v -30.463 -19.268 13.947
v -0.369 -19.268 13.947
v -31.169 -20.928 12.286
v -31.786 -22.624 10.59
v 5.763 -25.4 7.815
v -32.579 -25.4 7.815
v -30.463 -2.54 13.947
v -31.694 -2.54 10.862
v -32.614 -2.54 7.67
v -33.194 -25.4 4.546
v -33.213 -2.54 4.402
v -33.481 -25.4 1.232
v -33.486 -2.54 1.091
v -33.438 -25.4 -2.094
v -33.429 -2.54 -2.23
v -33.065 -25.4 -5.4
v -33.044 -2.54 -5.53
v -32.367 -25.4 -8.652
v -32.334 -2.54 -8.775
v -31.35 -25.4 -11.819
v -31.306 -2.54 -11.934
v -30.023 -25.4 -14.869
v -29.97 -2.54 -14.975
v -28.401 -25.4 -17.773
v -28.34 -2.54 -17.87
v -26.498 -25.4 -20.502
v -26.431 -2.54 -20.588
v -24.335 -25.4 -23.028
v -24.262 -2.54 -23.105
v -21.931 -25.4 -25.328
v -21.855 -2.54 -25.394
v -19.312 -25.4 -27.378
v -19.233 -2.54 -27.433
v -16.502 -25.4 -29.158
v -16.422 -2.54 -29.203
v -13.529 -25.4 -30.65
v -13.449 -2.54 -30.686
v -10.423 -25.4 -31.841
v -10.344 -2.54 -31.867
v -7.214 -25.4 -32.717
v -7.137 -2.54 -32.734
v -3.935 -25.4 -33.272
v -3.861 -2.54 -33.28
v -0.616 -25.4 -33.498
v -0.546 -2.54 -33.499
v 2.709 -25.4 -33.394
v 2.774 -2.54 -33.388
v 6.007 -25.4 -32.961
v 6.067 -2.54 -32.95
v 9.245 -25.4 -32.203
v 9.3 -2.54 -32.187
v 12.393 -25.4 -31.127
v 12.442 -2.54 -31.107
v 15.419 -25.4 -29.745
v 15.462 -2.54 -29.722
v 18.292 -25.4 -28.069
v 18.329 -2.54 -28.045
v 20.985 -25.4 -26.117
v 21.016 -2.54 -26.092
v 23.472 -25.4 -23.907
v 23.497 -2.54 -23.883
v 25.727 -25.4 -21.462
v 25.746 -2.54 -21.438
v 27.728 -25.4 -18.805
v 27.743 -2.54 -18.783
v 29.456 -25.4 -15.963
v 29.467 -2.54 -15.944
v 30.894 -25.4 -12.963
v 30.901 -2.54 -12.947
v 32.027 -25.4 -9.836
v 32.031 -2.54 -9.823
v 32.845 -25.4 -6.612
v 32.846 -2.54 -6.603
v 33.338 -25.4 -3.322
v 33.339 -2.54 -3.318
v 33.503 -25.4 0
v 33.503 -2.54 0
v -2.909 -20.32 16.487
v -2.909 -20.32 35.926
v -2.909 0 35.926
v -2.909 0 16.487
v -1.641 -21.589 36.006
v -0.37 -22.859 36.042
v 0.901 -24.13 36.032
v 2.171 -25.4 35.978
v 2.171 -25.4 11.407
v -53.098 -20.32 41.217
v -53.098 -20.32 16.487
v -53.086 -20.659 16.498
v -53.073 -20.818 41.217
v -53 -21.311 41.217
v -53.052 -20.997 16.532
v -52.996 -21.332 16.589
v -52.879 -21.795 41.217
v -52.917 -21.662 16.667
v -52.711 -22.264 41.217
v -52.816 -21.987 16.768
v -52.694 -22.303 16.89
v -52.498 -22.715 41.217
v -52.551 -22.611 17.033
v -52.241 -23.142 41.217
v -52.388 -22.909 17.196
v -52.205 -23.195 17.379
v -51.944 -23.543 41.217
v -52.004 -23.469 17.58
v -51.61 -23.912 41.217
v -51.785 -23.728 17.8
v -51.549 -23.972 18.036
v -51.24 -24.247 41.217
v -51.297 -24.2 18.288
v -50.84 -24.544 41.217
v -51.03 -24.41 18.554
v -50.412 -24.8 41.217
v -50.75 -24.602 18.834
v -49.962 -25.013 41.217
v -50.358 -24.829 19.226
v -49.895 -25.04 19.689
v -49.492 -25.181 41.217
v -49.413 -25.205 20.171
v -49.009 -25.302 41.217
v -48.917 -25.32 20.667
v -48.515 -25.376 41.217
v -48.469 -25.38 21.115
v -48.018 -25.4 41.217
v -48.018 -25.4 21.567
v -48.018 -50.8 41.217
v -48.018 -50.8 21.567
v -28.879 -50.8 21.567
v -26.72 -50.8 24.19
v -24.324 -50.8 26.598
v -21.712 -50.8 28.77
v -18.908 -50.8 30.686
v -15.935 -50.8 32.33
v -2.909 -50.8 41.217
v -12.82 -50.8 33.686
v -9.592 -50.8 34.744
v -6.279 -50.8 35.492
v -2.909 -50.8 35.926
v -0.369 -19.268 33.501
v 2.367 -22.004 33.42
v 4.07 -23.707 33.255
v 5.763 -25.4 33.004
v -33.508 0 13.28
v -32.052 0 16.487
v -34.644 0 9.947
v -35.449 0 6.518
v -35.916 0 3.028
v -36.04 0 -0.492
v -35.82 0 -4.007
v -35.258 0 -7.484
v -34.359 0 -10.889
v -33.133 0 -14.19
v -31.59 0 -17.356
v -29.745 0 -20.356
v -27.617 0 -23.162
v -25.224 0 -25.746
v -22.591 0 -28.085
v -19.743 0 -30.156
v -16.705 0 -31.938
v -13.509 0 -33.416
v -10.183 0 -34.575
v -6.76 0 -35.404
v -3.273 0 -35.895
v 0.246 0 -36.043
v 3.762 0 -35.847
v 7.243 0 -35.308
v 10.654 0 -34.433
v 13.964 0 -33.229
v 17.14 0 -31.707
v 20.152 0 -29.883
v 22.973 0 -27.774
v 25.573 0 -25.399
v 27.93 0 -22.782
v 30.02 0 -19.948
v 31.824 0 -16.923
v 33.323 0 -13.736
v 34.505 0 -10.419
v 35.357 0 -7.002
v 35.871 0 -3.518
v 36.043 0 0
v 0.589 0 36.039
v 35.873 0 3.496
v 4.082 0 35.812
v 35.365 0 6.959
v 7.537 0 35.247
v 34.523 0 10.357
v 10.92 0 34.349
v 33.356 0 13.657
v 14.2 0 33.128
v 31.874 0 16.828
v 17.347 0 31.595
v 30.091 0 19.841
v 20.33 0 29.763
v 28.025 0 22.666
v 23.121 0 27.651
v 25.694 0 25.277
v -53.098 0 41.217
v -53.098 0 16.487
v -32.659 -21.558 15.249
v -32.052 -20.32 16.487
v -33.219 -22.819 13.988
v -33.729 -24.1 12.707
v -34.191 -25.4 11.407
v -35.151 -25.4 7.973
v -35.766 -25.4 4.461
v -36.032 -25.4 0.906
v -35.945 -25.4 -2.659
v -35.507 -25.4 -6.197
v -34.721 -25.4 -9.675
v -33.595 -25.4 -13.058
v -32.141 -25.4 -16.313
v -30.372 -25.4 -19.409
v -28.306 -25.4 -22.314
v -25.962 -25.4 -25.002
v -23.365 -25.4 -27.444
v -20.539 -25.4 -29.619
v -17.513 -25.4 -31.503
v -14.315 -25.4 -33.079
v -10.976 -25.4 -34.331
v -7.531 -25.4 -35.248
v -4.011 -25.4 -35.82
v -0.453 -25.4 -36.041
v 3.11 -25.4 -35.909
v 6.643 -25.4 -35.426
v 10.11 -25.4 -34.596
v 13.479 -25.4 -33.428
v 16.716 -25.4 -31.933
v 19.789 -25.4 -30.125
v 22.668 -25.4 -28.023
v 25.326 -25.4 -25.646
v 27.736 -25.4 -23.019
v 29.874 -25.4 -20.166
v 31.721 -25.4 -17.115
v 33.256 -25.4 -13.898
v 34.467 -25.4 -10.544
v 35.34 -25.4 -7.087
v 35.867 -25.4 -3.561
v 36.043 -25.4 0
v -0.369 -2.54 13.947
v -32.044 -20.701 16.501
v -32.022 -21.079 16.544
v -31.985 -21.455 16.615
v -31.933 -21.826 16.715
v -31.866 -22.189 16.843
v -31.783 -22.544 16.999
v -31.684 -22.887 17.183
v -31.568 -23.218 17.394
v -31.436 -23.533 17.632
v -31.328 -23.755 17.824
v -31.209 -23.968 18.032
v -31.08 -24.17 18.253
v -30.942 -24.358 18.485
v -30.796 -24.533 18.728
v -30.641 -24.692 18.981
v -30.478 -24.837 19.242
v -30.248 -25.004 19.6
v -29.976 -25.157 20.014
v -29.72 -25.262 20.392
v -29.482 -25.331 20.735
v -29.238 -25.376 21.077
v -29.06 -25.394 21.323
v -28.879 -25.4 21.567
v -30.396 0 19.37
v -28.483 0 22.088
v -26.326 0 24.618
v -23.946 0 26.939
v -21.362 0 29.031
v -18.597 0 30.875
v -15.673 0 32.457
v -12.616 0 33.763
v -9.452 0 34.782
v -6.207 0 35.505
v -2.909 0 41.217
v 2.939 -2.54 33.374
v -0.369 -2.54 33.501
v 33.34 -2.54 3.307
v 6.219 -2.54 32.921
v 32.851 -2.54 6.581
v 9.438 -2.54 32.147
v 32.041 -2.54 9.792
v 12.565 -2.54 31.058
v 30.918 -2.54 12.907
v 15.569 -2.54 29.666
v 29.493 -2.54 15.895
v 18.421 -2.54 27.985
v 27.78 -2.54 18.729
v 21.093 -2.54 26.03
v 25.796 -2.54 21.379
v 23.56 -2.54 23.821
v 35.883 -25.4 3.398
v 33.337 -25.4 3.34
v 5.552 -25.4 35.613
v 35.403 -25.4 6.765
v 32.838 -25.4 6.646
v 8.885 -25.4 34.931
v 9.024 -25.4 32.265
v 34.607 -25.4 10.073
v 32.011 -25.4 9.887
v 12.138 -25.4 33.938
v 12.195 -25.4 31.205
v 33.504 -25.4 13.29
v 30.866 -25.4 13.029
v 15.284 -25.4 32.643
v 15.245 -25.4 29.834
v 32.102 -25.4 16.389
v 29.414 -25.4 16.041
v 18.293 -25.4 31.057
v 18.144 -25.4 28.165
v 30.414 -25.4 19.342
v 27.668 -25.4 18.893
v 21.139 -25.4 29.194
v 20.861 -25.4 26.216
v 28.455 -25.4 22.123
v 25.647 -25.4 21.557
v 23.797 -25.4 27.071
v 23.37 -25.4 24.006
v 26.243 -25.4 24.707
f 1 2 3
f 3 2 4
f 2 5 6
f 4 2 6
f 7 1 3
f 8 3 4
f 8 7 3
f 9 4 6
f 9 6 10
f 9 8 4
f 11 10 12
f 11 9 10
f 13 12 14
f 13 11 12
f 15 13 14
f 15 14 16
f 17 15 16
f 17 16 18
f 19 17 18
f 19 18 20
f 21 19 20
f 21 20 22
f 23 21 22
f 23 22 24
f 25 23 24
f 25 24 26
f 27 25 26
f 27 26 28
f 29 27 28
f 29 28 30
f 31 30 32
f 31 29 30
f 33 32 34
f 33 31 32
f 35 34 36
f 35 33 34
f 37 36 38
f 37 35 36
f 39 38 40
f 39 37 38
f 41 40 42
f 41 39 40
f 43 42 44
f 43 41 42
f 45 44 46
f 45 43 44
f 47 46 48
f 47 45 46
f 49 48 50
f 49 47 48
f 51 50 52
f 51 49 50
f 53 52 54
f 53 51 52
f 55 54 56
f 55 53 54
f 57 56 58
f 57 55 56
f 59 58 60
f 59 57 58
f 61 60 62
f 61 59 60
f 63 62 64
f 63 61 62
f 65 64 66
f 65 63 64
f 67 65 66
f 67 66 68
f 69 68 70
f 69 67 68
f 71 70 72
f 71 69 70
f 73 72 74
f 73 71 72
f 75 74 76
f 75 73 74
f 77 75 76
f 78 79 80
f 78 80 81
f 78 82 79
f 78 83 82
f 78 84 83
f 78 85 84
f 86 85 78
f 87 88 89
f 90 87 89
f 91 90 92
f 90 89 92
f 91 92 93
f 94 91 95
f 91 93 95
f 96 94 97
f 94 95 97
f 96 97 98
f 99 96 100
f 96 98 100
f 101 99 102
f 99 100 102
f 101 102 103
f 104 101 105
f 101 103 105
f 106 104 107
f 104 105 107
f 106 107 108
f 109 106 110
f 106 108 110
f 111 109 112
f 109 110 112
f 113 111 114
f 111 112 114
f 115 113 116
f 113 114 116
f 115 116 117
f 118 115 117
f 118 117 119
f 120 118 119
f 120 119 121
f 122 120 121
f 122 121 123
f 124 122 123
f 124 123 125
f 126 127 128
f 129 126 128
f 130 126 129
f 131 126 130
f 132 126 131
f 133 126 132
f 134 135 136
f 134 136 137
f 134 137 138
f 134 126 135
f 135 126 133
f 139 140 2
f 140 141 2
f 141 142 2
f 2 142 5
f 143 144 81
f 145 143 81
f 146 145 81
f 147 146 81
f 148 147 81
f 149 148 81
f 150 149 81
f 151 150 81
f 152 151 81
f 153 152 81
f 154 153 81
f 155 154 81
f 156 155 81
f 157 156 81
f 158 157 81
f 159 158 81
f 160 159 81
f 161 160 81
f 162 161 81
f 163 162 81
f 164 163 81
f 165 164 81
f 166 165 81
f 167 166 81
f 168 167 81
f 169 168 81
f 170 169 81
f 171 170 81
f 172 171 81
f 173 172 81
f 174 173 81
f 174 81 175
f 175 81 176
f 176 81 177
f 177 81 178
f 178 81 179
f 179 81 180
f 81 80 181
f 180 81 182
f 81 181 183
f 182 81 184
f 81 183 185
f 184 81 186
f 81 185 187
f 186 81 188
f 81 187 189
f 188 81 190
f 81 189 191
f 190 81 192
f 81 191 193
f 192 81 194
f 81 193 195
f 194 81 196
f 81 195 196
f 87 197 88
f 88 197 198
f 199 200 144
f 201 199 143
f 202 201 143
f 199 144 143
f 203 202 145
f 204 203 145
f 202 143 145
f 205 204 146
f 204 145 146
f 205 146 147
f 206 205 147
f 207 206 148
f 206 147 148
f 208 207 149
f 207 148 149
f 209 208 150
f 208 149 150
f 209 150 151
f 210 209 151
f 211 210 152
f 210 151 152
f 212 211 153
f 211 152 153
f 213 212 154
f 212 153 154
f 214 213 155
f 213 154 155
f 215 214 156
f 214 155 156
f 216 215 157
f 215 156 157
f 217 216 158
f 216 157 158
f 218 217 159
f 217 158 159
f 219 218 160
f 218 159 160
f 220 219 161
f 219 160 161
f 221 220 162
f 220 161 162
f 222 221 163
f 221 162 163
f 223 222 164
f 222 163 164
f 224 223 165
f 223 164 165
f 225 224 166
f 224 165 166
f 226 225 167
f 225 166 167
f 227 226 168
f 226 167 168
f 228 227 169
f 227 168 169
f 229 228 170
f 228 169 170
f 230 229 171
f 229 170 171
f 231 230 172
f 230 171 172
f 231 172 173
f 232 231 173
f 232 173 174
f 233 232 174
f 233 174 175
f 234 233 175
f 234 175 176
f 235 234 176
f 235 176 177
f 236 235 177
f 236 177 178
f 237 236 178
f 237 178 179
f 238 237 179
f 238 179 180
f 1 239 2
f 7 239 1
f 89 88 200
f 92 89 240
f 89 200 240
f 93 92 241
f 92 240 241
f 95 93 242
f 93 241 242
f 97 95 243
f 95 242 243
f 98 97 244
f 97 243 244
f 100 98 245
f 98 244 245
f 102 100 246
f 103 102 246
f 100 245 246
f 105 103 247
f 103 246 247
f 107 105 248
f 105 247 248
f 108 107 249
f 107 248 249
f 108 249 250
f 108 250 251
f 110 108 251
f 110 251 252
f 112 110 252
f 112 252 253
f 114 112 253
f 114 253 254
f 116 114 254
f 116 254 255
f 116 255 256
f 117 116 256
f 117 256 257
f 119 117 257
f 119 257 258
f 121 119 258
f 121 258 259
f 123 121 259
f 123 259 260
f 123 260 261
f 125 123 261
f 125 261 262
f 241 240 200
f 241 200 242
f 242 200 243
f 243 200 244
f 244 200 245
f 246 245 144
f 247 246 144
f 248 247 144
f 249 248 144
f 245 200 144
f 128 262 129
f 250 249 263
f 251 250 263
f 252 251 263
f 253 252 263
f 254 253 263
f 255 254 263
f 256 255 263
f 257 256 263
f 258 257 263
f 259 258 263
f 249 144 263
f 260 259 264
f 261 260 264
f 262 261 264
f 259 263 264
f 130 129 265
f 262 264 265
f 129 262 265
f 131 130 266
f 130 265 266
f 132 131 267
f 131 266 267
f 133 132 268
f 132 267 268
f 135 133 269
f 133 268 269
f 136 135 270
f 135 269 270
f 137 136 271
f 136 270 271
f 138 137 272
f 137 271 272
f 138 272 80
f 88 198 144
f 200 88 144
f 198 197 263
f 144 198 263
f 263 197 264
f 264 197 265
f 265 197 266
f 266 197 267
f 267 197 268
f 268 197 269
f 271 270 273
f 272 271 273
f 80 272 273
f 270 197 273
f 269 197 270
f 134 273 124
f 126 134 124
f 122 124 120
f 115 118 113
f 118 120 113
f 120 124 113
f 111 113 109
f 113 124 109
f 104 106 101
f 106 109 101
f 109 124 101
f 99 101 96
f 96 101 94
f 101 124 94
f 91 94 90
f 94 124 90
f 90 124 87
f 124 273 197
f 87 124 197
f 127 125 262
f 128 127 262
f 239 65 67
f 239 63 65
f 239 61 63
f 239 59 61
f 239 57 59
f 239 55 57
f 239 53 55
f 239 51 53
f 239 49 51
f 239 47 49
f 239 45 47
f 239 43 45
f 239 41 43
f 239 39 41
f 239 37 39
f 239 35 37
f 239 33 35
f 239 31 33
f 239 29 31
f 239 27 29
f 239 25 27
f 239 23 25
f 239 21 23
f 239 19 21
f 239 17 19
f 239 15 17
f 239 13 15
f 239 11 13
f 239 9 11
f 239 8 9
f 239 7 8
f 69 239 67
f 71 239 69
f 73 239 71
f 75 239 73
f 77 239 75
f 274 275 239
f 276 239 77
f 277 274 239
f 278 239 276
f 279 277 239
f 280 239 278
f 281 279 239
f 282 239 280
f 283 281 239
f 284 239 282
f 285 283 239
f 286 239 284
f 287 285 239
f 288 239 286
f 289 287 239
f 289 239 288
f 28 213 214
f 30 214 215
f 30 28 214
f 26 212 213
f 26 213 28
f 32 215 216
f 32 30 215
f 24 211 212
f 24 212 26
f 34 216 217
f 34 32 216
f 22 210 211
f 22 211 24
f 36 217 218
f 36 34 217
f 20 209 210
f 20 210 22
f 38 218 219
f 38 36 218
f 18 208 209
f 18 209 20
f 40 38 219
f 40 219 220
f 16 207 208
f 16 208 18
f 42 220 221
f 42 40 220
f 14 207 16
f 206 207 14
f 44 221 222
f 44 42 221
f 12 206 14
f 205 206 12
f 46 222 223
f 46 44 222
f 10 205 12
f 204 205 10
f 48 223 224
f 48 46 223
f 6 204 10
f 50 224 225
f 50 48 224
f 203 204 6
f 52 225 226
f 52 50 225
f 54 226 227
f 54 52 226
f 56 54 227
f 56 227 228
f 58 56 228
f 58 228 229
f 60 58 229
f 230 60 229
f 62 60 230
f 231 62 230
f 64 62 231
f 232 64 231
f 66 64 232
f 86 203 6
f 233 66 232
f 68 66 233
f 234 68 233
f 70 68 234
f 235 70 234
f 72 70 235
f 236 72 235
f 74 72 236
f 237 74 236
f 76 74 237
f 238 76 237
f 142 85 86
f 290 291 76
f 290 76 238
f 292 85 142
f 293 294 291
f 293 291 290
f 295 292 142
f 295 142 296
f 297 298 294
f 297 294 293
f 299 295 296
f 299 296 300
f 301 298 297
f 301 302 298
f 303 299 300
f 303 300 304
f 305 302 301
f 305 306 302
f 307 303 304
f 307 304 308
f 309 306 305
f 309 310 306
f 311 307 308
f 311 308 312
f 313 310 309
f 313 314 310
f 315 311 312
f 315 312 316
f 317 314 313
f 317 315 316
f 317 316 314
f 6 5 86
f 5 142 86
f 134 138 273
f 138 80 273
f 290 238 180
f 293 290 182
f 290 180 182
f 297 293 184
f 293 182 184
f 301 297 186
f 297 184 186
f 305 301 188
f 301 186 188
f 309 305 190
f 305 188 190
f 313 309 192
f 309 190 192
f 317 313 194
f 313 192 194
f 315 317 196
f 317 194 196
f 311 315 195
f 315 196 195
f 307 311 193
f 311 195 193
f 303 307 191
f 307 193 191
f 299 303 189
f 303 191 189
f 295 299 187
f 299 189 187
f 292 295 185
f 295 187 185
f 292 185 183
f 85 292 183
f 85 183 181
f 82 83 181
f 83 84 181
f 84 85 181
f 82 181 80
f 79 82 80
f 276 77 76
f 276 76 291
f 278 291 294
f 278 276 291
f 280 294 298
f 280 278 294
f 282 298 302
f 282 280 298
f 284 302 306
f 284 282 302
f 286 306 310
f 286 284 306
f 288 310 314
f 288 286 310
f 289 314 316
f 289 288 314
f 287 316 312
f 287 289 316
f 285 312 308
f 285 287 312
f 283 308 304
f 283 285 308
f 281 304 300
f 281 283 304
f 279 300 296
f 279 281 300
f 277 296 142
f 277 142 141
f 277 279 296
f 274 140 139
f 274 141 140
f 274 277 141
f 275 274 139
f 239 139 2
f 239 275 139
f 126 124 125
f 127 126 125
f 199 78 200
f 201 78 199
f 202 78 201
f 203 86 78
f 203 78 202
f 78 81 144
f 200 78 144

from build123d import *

# Parameters (mm, degrees)
F1_DEPTH = 25.4
F2_R     = 5.08
F3_SIZE  = 5.08
F4_T     = -2.54
F5_DEPTH = 25.4


with BuildPart() as f1:
    # F0 (on Front) → F1 (new body)
    with BuildSketch(Plane.XZ):
        with BuildLine():
            ThreePointArc((-32.0517227431, 16.4869092405), (-20.0009755061, 29.9848642803), (-2.9094549827, 35.925842771))
            Line((-2.9094549827, 35.925842771), (-2.9094549827, 41.2172712386))
            Line((-2.9094549827, 41.2172712386), (-53.0975461006, 41.2172712386))
            Line((-53.0975461006, 41.2172712386), (-53.0975461006, 16.4869092405))
            Line((-53.0975461006, 16.4869092405), (-32.0517227431, 16.4869092405))
        make_face()
    extrude(amount=F1_DEPTH)

    # F2
    f2_edges = [f1.edges().sort_by_distance(p)[0] for p in [
        (-53.097546, -25.4, 28.85209),
        (-42.574634, -25.4, 16.486909),
    ]]
    fillet(f2_edges, radius=F2_R)

    # F5 (add): a face of the model
    f5_faces = [f1.faces().sort_by_distance(p)[0] for p in [
        (-30.4342357223, -25.4, 33.0216663243),
    ]]
    extrude(f5_faces, amount=F5_DEPTH)


with BuildPart() as f1b:
    # F0 (on Front) → F1, piece 2 (new body)
    with BuildSketch(Plane.XZ):
        with BuildLine():
            ThreePointArc((-32.0517227431, 16.4869092405), (-8.4816294649, -35.0313155437), (36.0434613641, 0))
            ThreePointArc((36.0434613641, 0), (24.4362873494, 26.4952631178), (-2.9094549827, 35.925842771))
            Line((-2.9094549827, 35.925842771), (-2.9094549827, 16.4869092405))
            Line((-2.9094549827, 16.4869092405), (-32.0517227431, 16.4869092405))
        make_face()
    extrude(amount=F1_DEPTH)

    # F3
    f3_edges = [f1b.edges().sort_by_distance(p)[0] for p in [
        (-17.480589, -25.4, 16.486909),
        (-2.909455, -25.4, 26.206376),
    ]]
    chamfer(f3_edges, length=F3_SIZE)

    # F4
    f4_openings = [f1b.faces().sort_by_distance(p)[0] for p in [
        (2.458641, -25.4, -4.276447),
    ]]
    offset(amount=F4_T, openings=f4_openings, kind=Kind.INTERSECTION)


solid = Compound([f1.part, f1b.part])
